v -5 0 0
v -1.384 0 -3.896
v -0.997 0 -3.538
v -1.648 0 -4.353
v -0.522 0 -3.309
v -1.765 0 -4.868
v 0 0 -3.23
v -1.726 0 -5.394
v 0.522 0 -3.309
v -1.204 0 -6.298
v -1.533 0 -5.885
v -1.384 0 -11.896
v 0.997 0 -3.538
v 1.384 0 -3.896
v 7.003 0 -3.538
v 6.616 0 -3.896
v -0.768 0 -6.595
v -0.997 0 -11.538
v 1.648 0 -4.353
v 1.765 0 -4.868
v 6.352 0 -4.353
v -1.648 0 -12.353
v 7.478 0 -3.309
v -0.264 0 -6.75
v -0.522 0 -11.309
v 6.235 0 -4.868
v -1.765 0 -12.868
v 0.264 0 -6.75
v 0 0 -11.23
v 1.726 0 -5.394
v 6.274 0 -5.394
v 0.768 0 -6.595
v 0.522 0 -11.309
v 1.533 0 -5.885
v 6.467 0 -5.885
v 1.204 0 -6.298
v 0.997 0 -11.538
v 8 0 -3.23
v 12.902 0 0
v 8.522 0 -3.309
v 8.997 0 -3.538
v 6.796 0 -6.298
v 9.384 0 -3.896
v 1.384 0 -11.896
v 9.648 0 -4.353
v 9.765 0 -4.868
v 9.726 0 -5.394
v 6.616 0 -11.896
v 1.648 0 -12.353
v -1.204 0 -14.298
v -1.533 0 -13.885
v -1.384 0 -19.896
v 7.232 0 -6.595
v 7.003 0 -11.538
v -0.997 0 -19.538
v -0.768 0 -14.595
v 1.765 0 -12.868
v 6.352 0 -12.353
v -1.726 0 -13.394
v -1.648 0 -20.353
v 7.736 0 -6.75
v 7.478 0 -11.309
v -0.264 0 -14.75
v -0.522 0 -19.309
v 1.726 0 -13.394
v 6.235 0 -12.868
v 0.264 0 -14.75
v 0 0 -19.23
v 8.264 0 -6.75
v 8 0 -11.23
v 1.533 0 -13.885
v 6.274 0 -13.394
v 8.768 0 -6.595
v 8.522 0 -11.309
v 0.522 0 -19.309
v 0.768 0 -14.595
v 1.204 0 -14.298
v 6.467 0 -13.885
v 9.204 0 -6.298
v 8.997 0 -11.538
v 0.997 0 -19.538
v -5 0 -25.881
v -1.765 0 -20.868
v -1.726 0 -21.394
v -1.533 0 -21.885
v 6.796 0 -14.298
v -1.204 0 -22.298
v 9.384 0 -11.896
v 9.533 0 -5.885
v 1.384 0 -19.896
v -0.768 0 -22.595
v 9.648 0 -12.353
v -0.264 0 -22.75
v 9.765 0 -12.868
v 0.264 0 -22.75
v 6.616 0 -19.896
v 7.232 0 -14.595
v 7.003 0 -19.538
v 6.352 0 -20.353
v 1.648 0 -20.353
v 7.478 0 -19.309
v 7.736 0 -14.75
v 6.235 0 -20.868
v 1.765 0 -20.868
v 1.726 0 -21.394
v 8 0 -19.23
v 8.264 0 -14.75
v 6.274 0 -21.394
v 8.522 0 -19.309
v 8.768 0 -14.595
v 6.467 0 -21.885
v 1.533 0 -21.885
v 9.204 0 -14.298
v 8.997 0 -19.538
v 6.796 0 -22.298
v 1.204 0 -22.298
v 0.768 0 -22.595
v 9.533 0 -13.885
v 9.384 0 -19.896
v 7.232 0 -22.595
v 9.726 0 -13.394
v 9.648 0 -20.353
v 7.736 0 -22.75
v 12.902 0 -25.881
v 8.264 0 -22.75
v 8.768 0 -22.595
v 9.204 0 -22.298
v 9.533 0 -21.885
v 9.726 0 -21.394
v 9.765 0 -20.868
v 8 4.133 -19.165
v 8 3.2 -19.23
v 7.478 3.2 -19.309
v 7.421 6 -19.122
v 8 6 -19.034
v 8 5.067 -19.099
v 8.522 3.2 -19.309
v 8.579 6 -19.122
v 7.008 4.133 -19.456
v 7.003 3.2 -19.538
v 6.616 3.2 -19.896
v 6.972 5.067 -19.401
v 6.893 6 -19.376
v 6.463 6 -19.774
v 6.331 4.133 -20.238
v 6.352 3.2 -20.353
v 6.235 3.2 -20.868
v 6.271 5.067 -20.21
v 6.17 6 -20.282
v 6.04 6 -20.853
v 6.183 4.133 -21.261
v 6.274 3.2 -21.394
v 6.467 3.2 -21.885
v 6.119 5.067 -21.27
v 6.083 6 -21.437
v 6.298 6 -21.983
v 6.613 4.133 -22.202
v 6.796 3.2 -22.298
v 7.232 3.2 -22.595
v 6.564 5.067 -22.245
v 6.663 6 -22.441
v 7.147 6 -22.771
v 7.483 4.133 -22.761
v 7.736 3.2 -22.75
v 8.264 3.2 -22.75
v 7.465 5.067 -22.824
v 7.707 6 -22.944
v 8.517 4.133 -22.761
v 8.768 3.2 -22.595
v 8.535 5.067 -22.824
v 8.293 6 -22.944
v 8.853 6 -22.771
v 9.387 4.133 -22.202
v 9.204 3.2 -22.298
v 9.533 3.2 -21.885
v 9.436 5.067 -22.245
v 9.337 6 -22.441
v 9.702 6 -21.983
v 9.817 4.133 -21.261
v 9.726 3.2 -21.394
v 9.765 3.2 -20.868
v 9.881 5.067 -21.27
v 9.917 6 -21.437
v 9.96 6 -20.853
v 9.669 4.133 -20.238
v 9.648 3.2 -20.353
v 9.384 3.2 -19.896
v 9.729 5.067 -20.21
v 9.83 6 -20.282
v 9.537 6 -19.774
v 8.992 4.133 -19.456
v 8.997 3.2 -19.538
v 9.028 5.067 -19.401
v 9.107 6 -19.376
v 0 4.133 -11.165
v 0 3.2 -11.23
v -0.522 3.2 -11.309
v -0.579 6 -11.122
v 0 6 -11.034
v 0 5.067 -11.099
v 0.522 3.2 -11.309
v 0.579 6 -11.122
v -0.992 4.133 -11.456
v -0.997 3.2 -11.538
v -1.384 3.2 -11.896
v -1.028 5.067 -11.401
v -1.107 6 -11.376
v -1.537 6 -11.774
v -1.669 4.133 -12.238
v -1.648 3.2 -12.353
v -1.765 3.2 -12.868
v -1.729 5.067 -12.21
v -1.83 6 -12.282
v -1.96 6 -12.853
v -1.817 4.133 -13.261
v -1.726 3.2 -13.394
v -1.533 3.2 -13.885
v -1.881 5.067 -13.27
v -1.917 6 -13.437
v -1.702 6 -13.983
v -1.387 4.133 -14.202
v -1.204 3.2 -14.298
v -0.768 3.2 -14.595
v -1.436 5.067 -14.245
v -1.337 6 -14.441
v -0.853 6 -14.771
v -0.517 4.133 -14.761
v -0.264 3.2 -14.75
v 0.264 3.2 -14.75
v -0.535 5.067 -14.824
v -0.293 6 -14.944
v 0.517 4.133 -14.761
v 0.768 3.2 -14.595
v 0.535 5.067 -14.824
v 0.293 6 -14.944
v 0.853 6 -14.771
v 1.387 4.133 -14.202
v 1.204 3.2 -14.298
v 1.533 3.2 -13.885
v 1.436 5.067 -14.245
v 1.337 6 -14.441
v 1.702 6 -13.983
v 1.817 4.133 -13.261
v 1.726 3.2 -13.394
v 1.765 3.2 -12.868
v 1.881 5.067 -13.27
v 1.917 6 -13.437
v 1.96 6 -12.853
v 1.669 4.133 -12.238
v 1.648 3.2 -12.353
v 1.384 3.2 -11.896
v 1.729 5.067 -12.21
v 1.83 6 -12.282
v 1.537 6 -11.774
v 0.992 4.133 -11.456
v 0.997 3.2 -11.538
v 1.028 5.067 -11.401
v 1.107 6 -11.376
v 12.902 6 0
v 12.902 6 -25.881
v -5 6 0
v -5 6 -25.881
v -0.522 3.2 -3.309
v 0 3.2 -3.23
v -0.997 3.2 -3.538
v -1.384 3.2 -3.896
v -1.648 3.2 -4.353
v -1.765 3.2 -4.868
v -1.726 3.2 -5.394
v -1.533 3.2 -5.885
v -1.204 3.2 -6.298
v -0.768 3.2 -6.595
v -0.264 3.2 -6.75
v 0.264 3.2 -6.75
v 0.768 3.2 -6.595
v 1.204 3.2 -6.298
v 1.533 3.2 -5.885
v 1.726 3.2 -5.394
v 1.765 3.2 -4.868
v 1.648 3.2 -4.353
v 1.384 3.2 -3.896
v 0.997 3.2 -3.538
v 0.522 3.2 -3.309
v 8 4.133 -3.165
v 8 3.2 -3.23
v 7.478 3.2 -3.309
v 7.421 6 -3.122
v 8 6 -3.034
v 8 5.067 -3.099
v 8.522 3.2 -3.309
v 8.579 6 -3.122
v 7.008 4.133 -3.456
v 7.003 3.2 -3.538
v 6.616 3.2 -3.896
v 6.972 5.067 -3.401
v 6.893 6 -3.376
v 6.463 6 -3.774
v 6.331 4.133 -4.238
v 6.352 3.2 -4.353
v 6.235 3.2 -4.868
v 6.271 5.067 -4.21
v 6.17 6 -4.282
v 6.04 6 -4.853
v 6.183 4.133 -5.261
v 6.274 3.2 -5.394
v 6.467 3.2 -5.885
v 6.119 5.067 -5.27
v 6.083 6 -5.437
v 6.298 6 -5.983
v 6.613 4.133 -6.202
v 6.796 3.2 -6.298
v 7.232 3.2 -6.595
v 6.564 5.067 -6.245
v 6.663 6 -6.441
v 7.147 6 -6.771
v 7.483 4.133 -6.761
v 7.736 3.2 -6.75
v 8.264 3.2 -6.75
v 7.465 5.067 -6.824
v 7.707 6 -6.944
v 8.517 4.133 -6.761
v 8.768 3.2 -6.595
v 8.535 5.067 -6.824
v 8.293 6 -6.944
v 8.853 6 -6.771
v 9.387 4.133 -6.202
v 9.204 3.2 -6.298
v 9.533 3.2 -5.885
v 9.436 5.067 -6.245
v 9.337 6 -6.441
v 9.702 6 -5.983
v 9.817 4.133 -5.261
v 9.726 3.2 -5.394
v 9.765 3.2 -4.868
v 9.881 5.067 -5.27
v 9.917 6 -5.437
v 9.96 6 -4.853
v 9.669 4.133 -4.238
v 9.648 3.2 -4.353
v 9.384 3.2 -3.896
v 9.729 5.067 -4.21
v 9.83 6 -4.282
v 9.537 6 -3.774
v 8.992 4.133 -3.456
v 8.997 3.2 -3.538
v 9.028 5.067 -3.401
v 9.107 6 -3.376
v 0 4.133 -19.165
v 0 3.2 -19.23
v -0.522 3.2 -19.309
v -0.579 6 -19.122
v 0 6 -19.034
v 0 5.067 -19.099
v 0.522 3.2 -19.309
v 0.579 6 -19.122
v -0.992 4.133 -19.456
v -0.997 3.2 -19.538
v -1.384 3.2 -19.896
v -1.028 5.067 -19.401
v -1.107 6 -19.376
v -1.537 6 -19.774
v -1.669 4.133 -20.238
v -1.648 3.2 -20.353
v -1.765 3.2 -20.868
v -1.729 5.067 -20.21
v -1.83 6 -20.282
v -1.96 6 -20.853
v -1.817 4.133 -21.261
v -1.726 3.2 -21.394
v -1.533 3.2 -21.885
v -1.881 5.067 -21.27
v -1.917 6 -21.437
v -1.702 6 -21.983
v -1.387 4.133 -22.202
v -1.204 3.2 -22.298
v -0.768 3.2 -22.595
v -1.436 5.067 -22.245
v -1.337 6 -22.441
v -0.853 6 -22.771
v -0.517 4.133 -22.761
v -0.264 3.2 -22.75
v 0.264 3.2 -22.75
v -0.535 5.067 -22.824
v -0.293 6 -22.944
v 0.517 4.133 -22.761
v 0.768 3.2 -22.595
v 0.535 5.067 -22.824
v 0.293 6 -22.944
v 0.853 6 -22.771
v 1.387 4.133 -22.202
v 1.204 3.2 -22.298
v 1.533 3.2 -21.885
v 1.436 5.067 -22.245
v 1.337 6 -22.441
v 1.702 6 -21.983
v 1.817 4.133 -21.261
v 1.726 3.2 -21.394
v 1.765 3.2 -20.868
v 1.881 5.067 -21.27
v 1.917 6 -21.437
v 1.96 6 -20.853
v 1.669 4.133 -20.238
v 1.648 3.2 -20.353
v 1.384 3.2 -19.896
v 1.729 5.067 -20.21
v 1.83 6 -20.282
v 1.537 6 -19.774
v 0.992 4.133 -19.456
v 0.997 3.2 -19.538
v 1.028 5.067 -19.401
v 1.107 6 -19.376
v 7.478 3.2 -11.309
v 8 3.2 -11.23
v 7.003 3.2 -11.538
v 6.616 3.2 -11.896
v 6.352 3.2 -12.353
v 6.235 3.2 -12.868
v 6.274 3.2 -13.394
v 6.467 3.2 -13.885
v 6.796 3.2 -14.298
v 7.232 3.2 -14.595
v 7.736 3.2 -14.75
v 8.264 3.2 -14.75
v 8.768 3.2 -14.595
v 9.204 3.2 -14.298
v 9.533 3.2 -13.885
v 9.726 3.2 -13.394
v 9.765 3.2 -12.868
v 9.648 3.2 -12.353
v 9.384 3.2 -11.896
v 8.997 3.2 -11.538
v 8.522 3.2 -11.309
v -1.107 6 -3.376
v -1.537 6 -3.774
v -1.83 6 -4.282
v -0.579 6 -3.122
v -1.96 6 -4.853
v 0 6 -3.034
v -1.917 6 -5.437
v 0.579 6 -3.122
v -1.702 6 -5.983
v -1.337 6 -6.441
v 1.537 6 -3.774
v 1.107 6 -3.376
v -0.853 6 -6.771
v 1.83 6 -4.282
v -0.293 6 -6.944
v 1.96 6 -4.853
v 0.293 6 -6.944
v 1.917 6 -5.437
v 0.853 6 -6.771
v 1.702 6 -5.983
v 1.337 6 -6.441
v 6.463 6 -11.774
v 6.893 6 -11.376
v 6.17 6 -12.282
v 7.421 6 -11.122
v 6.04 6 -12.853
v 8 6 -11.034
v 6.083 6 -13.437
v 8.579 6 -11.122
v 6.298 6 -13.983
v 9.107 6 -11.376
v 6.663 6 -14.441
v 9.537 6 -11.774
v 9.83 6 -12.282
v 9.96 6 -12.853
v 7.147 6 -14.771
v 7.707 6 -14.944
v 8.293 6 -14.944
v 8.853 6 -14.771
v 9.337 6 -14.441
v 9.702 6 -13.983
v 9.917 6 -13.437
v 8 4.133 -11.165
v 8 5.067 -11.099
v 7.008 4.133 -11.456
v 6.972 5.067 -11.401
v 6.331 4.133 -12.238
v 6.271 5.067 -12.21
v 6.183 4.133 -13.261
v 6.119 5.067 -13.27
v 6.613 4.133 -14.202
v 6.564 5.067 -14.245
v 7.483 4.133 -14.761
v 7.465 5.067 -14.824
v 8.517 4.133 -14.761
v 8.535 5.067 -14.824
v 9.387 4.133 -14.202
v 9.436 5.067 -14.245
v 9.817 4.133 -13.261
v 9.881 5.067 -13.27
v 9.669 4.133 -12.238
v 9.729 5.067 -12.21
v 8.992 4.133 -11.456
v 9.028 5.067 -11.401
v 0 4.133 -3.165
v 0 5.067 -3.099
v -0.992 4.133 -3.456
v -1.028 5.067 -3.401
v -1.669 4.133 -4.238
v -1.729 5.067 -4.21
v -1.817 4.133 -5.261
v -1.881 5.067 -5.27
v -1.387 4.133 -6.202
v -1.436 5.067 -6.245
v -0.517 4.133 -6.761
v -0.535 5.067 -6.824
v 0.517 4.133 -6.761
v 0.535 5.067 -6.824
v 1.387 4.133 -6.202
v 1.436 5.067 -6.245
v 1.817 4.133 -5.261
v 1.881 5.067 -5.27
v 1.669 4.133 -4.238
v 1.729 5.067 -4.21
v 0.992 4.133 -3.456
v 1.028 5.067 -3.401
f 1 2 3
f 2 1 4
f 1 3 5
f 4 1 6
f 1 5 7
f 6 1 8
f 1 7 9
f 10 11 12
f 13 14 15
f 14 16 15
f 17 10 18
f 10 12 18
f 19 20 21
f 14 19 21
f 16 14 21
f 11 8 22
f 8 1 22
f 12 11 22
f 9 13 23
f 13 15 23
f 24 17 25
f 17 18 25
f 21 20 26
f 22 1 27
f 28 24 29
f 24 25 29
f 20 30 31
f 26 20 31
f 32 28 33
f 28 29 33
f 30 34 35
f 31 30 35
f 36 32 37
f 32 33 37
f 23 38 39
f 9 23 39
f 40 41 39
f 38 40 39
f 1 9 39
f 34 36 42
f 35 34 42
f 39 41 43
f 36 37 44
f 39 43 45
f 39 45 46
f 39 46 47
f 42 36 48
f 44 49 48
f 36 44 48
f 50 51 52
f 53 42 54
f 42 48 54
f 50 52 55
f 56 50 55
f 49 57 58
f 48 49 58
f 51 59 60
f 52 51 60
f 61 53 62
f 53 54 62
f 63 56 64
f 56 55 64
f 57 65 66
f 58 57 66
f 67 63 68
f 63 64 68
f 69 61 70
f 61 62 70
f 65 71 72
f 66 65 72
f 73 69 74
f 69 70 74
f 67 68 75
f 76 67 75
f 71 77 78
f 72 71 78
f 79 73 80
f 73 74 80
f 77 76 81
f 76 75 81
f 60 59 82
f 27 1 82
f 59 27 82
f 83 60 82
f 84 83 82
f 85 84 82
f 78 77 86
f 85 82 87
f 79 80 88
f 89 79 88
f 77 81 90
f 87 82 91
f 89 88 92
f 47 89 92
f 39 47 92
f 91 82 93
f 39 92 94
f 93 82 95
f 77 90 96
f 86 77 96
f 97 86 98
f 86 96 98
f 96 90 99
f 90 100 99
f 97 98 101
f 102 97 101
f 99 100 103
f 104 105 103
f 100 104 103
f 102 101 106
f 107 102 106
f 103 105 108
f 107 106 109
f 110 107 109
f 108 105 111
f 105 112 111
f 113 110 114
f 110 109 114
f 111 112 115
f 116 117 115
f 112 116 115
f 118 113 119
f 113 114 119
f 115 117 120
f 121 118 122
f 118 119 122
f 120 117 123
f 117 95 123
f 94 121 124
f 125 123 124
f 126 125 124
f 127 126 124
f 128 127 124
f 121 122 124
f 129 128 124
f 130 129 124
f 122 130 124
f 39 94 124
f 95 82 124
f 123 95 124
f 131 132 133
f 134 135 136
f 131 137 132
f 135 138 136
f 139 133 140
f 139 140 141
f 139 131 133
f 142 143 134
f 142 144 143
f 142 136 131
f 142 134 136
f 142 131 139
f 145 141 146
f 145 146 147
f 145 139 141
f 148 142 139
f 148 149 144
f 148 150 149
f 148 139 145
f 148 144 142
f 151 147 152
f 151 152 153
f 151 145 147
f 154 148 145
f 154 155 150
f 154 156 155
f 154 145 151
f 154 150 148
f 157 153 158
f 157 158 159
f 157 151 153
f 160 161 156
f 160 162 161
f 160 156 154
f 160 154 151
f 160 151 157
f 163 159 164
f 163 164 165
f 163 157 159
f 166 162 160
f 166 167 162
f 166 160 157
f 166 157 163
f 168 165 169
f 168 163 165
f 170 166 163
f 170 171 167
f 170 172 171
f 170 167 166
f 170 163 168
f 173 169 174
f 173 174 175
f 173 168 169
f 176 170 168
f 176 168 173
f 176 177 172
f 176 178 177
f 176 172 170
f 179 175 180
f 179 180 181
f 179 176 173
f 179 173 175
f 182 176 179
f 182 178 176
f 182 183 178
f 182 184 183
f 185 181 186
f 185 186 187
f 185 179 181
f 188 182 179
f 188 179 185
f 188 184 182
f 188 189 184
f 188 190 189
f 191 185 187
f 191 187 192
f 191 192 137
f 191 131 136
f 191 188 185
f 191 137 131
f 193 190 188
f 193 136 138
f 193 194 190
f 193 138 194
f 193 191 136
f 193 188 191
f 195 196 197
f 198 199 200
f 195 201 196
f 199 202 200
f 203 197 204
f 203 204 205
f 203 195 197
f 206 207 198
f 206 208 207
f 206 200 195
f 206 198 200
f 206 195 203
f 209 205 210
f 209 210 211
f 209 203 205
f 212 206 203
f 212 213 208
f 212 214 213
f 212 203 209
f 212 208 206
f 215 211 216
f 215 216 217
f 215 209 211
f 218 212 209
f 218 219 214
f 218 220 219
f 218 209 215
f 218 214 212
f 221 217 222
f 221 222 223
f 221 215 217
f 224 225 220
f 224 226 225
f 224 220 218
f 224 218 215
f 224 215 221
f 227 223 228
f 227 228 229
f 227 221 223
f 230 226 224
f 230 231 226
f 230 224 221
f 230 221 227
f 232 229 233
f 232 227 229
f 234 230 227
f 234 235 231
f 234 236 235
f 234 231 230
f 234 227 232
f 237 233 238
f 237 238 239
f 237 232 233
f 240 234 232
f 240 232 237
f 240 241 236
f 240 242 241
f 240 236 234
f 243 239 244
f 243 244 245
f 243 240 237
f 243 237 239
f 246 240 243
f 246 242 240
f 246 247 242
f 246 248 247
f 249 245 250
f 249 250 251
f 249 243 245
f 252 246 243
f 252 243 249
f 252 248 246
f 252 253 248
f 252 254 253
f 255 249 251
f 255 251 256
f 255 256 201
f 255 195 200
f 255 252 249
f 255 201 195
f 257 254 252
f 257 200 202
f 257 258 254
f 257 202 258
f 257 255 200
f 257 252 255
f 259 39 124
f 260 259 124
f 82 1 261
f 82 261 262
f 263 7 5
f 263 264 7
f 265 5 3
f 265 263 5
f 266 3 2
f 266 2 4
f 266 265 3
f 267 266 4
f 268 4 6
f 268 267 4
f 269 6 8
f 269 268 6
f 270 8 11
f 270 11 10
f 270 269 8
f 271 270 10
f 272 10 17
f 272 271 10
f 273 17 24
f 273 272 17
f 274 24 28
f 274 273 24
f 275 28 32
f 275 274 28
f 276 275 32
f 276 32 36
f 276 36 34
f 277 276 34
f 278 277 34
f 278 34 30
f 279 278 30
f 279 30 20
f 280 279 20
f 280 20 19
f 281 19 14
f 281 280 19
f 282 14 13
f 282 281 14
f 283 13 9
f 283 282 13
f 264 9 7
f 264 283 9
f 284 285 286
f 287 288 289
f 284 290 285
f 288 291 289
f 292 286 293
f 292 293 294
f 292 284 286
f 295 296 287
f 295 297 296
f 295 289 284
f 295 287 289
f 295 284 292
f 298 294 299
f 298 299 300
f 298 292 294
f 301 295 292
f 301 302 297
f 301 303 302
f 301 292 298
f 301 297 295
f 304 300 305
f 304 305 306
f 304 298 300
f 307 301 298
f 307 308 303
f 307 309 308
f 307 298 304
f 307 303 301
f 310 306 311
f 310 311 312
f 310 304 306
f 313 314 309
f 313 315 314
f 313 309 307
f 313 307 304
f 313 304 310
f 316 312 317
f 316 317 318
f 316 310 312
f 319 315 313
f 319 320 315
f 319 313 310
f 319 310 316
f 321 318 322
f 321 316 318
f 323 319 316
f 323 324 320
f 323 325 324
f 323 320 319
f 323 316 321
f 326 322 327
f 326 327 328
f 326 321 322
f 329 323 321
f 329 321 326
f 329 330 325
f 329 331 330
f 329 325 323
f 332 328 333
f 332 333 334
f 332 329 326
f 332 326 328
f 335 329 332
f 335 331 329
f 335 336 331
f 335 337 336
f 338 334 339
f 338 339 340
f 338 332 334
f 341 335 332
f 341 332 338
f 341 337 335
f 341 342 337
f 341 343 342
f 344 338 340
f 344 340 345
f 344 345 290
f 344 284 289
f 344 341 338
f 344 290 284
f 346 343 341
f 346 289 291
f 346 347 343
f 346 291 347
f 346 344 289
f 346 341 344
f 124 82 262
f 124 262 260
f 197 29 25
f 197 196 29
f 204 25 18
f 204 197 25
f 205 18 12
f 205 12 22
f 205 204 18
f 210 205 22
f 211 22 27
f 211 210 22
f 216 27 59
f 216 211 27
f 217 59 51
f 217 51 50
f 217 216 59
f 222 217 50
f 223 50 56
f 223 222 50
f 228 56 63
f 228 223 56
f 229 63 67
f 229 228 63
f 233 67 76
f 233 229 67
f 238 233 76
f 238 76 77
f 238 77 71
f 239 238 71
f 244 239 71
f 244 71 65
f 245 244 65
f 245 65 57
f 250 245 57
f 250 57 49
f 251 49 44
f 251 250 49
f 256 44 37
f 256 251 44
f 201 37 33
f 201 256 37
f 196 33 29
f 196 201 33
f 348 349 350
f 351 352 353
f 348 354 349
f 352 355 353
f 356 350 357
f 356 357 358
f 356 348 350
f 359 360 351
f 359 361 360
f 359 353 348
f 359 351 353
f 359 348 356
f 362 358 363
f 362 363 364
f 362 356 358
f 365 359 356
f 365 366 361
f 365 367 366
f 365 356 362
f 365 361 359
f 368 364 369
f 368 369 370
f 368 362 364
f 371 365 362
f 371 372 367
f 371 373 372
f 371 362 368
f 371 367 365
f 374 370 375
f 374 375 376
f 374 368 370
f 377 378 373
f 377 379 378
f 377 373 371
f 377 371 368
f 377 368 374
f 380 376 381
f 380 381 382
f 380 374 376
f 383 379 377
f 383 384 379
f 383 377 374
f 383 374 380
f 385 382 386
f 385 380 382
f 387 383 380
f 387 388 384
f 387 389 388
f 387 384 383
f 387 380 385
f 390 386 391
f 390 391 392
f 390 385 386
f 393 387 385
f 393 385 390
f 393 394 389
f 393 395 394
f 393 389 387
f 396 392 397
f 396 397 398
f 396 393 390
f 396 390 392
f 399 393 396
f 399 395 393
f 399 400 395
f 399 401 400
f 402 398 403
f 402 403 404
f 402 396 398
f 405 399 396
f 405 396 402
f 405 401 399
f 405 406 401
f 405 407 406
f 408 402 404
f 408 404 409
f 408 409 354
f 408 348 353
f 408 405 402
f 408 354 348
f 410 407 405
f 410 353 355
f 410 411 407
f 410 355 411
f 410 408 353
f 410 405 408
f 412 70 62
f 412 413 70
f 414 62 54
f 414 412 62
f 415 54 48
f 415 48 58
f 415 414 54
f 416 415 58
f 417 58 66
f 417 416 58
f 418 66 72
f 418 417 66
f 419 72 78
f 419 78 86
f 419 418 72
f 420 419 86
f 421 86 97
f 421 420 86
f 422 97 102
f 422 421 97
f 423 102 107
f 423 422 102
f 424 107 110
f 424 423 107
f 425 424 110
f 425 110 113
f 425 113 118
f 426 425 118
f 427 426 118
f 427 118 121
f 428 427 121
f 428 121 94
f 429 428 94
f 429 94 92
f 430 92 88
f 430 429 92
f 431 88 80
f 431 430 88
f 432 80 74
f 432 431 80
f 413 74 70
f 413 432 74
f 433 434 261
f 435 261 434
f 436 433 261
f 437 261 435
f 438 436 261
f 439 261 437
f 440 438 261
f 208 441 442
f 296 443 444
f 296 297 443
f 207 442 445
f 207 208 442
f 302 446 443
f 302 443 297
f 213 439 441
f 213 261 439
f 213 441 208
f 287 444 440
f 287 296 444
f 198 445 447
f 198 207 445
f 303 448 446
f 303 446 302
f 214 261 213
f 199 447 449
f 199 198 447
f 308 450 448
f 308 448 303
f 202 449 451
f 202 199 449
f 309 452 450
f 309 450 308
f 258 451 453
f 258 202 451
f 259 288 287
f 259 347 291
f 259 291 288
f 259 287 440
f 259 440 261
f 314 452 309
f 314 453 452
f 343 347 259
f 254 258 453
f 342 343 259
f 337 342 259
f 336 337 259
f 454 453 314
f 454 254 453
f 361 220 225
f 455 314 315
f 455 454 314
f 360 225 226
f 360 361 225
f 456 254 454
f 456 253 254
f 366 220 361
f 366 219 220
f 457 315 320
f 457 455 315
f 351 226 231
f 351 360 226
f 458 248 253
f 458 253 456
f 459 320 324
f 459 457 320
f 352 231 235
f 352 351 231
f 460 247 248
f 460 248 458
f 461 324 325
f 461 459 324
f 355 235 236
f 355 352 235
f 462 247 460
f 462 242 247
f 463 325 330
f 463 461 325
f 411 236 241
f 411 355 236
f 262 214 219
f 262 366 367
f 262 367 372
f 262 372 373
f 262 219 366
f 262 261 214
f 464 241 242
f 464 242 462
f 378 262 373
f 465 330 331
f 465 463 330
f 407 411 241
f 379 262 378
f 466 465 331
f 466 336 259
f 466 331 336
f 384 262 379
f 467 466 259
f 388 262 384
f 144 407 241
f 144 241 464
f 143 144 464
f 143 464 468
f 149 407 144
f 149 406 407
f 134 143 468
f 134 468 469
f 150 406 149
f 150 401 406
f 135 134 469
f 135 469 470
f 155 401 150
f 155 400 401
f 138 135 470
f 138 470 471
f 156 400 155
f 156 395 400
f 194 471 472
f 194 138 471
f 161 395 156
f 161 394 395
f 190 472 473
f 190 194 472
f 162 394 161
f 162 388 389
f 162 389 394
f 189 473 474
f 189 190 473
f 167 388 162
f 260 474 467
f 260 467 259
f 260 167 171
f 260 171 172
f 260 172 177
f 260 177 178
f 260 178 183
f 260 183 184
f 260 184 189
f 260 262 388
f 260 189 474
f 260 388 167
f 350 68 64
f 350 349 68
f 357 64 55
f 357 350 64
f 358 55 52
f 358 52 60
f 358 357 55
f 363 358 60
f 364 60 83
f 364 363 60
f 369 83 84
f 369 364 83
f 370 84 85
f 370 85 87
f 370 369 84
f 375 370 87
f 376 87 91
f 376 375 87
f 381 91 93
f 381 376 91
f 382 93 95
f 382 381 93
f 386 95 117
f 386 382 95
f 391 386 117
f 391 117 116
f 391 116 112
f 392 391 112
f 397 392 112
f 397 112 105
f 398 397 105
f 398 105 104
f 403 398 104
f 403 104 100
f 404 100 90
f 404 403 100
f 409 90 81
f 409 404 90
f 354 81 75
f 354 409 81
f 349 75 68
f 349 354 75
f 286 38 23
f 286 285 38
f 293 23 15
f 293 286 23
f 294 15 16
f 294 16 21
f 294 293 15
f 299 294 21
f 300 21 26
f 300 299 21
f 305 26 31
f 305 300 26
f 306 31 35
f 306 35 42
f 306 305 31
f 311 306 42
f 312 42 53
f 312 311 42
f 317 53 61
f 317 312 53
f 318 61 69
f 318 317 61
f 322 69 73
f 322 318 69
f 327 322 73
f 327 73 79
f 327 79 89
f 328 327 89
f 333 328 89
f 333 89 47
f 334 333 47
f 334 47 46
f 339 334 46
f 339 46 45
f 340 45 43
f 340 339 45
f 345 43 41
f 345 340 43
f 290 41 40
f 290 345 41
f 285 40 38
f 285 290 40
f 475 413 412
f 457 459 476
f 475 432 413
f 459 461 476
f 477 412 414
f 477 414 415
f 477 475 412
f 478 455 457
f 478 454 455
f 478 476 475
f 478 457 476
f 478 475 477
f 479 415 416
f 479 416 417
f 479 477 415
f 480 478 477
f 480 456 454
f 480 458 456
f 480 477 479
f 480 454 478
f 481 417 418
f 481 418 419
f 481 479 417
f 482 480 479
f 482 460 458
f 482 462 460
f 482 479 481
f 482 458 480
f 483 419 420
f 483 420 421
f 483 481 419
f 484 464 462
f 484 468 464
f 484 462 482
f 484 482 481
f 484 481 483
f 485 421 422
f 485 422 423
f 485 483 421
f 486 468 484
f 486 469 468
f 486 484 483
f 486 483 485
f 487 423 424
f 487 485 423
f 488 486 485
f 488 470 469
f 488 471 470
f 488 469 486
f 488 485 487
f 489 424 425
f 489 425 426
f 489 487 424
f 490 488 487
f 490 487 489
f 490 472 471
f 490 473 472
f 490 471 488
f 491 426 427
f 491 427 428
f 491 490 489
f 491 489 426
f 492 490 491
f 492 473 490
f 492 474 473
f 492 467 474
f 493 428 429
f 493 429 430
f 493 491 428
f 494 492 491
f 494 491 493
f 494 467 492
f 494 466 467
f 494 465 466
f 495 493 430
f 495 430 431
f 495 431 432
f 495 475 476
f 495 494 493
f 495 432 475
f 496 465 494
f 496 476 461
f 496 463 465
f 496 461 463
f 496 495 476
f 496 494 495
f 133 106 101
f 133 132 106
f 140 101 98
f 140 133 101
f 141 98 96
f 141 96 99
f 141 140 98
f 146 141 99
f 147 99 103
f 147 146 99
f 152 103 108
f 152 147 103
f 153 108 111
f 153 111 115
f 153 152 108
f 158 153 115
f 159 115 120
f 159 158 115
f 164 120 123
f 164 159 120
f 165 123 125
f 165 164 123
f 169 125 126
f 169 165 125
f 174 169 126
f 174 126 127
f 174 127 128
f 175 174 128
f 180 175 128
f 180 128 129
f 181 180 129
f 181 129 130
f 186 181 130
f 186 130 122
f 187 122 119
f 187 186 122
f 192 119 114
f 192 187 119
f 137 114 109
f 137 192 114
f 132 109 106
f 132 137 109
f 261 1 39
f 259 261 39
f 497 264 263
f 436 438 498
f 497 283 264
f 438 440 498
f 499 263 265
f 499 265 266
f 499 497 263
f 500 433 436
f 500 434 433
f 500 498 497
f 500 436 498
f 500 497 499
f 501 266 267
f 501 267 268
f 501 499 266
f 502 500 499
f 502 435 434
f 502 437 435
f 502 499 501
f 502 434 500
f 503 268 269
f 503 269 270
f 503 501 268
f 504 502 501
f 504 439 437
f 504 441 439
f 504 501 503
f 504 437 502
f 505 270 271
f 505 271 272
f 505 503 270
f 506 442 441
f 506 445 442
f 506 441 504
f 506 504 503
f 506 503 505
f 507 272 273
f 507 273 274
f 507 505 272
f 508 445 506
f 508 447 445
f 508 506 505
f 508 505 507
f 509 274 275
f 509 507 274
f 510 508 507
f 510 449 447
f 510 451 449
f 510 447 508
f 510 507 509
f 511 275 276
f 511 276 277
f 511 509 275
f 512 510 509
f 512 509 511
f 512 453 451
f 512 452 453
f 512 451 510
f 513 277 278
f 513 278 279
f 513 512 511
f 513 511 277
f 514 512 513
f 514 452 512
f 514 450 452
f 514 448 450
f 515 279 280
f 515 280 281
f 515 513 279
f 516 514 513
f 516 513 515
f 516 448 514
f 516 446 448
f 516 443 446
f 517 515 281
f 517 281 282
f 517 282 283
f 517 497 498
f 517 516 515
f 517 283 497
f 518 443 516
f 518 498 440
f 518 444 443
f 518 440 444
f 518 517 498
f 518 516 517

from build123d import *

# Parameters (mm, degrees)
SKETCH1_W            = 17.902420718
SKETCH1_H            = 25.880604579
BOSS_EXTRUDE1_DEPTH  = 6
LPATTERN1_COUNT      = 3
LPATTERN1_PITCH      = 8
LPATTERN1_COUNT_DIR2 = 2
LPATTERN1_PITCH_DIR2 = 8


with BuildPart() as part:
    # Sketch1 → Boss-Extrude1 (new body)
    with BuildSketch(Plane(origin=(0, 0, 0), x_dir=(1, 0, 0), z_dir=(0, 1, 0))):
        with Locations((3.951210359, 12.940302289)):
            Rectangle(SKETCH1_W, SKETCH1_H)
    extrude(amount=BOSS_EXTRUDE1_DEPTH)

    # Sketch3 → Cut-Revolve1 (revolve, cut)
    with BuildSketch(Plane.ZY, mode=Mode.PRIVATE) as cut_revolve1_sk:
        Polygon((-5, 6), (-5, 0), (-6.77, 0), (-6.77, 3.2), (-6.965795073, 6), align=None)
    cut_revolve1 = revolve(cut_revolve1_sk.sketch.rotate(Axis((0, 6, -5), (0, -1, 0)), 180), axis=Axis((0, 6, -5), (0, -1, 0)), mode=Mode.SUBTRACT)

    # LPattern1: Cut-Revolve1 3 × 2
    with Locations(*[(j * LPATTERN1_PITCH_DIR2, 0, -i * LPATTERN1_PITCH) for i in range(LPATTERN1_COUNT) for j in range(LPATTERN1_COUNT_DIR2) if (i, j) != (0, 0)]):
        add(cut_revolve1, mode=Mode.SUBTRACT)


solid = part.part
